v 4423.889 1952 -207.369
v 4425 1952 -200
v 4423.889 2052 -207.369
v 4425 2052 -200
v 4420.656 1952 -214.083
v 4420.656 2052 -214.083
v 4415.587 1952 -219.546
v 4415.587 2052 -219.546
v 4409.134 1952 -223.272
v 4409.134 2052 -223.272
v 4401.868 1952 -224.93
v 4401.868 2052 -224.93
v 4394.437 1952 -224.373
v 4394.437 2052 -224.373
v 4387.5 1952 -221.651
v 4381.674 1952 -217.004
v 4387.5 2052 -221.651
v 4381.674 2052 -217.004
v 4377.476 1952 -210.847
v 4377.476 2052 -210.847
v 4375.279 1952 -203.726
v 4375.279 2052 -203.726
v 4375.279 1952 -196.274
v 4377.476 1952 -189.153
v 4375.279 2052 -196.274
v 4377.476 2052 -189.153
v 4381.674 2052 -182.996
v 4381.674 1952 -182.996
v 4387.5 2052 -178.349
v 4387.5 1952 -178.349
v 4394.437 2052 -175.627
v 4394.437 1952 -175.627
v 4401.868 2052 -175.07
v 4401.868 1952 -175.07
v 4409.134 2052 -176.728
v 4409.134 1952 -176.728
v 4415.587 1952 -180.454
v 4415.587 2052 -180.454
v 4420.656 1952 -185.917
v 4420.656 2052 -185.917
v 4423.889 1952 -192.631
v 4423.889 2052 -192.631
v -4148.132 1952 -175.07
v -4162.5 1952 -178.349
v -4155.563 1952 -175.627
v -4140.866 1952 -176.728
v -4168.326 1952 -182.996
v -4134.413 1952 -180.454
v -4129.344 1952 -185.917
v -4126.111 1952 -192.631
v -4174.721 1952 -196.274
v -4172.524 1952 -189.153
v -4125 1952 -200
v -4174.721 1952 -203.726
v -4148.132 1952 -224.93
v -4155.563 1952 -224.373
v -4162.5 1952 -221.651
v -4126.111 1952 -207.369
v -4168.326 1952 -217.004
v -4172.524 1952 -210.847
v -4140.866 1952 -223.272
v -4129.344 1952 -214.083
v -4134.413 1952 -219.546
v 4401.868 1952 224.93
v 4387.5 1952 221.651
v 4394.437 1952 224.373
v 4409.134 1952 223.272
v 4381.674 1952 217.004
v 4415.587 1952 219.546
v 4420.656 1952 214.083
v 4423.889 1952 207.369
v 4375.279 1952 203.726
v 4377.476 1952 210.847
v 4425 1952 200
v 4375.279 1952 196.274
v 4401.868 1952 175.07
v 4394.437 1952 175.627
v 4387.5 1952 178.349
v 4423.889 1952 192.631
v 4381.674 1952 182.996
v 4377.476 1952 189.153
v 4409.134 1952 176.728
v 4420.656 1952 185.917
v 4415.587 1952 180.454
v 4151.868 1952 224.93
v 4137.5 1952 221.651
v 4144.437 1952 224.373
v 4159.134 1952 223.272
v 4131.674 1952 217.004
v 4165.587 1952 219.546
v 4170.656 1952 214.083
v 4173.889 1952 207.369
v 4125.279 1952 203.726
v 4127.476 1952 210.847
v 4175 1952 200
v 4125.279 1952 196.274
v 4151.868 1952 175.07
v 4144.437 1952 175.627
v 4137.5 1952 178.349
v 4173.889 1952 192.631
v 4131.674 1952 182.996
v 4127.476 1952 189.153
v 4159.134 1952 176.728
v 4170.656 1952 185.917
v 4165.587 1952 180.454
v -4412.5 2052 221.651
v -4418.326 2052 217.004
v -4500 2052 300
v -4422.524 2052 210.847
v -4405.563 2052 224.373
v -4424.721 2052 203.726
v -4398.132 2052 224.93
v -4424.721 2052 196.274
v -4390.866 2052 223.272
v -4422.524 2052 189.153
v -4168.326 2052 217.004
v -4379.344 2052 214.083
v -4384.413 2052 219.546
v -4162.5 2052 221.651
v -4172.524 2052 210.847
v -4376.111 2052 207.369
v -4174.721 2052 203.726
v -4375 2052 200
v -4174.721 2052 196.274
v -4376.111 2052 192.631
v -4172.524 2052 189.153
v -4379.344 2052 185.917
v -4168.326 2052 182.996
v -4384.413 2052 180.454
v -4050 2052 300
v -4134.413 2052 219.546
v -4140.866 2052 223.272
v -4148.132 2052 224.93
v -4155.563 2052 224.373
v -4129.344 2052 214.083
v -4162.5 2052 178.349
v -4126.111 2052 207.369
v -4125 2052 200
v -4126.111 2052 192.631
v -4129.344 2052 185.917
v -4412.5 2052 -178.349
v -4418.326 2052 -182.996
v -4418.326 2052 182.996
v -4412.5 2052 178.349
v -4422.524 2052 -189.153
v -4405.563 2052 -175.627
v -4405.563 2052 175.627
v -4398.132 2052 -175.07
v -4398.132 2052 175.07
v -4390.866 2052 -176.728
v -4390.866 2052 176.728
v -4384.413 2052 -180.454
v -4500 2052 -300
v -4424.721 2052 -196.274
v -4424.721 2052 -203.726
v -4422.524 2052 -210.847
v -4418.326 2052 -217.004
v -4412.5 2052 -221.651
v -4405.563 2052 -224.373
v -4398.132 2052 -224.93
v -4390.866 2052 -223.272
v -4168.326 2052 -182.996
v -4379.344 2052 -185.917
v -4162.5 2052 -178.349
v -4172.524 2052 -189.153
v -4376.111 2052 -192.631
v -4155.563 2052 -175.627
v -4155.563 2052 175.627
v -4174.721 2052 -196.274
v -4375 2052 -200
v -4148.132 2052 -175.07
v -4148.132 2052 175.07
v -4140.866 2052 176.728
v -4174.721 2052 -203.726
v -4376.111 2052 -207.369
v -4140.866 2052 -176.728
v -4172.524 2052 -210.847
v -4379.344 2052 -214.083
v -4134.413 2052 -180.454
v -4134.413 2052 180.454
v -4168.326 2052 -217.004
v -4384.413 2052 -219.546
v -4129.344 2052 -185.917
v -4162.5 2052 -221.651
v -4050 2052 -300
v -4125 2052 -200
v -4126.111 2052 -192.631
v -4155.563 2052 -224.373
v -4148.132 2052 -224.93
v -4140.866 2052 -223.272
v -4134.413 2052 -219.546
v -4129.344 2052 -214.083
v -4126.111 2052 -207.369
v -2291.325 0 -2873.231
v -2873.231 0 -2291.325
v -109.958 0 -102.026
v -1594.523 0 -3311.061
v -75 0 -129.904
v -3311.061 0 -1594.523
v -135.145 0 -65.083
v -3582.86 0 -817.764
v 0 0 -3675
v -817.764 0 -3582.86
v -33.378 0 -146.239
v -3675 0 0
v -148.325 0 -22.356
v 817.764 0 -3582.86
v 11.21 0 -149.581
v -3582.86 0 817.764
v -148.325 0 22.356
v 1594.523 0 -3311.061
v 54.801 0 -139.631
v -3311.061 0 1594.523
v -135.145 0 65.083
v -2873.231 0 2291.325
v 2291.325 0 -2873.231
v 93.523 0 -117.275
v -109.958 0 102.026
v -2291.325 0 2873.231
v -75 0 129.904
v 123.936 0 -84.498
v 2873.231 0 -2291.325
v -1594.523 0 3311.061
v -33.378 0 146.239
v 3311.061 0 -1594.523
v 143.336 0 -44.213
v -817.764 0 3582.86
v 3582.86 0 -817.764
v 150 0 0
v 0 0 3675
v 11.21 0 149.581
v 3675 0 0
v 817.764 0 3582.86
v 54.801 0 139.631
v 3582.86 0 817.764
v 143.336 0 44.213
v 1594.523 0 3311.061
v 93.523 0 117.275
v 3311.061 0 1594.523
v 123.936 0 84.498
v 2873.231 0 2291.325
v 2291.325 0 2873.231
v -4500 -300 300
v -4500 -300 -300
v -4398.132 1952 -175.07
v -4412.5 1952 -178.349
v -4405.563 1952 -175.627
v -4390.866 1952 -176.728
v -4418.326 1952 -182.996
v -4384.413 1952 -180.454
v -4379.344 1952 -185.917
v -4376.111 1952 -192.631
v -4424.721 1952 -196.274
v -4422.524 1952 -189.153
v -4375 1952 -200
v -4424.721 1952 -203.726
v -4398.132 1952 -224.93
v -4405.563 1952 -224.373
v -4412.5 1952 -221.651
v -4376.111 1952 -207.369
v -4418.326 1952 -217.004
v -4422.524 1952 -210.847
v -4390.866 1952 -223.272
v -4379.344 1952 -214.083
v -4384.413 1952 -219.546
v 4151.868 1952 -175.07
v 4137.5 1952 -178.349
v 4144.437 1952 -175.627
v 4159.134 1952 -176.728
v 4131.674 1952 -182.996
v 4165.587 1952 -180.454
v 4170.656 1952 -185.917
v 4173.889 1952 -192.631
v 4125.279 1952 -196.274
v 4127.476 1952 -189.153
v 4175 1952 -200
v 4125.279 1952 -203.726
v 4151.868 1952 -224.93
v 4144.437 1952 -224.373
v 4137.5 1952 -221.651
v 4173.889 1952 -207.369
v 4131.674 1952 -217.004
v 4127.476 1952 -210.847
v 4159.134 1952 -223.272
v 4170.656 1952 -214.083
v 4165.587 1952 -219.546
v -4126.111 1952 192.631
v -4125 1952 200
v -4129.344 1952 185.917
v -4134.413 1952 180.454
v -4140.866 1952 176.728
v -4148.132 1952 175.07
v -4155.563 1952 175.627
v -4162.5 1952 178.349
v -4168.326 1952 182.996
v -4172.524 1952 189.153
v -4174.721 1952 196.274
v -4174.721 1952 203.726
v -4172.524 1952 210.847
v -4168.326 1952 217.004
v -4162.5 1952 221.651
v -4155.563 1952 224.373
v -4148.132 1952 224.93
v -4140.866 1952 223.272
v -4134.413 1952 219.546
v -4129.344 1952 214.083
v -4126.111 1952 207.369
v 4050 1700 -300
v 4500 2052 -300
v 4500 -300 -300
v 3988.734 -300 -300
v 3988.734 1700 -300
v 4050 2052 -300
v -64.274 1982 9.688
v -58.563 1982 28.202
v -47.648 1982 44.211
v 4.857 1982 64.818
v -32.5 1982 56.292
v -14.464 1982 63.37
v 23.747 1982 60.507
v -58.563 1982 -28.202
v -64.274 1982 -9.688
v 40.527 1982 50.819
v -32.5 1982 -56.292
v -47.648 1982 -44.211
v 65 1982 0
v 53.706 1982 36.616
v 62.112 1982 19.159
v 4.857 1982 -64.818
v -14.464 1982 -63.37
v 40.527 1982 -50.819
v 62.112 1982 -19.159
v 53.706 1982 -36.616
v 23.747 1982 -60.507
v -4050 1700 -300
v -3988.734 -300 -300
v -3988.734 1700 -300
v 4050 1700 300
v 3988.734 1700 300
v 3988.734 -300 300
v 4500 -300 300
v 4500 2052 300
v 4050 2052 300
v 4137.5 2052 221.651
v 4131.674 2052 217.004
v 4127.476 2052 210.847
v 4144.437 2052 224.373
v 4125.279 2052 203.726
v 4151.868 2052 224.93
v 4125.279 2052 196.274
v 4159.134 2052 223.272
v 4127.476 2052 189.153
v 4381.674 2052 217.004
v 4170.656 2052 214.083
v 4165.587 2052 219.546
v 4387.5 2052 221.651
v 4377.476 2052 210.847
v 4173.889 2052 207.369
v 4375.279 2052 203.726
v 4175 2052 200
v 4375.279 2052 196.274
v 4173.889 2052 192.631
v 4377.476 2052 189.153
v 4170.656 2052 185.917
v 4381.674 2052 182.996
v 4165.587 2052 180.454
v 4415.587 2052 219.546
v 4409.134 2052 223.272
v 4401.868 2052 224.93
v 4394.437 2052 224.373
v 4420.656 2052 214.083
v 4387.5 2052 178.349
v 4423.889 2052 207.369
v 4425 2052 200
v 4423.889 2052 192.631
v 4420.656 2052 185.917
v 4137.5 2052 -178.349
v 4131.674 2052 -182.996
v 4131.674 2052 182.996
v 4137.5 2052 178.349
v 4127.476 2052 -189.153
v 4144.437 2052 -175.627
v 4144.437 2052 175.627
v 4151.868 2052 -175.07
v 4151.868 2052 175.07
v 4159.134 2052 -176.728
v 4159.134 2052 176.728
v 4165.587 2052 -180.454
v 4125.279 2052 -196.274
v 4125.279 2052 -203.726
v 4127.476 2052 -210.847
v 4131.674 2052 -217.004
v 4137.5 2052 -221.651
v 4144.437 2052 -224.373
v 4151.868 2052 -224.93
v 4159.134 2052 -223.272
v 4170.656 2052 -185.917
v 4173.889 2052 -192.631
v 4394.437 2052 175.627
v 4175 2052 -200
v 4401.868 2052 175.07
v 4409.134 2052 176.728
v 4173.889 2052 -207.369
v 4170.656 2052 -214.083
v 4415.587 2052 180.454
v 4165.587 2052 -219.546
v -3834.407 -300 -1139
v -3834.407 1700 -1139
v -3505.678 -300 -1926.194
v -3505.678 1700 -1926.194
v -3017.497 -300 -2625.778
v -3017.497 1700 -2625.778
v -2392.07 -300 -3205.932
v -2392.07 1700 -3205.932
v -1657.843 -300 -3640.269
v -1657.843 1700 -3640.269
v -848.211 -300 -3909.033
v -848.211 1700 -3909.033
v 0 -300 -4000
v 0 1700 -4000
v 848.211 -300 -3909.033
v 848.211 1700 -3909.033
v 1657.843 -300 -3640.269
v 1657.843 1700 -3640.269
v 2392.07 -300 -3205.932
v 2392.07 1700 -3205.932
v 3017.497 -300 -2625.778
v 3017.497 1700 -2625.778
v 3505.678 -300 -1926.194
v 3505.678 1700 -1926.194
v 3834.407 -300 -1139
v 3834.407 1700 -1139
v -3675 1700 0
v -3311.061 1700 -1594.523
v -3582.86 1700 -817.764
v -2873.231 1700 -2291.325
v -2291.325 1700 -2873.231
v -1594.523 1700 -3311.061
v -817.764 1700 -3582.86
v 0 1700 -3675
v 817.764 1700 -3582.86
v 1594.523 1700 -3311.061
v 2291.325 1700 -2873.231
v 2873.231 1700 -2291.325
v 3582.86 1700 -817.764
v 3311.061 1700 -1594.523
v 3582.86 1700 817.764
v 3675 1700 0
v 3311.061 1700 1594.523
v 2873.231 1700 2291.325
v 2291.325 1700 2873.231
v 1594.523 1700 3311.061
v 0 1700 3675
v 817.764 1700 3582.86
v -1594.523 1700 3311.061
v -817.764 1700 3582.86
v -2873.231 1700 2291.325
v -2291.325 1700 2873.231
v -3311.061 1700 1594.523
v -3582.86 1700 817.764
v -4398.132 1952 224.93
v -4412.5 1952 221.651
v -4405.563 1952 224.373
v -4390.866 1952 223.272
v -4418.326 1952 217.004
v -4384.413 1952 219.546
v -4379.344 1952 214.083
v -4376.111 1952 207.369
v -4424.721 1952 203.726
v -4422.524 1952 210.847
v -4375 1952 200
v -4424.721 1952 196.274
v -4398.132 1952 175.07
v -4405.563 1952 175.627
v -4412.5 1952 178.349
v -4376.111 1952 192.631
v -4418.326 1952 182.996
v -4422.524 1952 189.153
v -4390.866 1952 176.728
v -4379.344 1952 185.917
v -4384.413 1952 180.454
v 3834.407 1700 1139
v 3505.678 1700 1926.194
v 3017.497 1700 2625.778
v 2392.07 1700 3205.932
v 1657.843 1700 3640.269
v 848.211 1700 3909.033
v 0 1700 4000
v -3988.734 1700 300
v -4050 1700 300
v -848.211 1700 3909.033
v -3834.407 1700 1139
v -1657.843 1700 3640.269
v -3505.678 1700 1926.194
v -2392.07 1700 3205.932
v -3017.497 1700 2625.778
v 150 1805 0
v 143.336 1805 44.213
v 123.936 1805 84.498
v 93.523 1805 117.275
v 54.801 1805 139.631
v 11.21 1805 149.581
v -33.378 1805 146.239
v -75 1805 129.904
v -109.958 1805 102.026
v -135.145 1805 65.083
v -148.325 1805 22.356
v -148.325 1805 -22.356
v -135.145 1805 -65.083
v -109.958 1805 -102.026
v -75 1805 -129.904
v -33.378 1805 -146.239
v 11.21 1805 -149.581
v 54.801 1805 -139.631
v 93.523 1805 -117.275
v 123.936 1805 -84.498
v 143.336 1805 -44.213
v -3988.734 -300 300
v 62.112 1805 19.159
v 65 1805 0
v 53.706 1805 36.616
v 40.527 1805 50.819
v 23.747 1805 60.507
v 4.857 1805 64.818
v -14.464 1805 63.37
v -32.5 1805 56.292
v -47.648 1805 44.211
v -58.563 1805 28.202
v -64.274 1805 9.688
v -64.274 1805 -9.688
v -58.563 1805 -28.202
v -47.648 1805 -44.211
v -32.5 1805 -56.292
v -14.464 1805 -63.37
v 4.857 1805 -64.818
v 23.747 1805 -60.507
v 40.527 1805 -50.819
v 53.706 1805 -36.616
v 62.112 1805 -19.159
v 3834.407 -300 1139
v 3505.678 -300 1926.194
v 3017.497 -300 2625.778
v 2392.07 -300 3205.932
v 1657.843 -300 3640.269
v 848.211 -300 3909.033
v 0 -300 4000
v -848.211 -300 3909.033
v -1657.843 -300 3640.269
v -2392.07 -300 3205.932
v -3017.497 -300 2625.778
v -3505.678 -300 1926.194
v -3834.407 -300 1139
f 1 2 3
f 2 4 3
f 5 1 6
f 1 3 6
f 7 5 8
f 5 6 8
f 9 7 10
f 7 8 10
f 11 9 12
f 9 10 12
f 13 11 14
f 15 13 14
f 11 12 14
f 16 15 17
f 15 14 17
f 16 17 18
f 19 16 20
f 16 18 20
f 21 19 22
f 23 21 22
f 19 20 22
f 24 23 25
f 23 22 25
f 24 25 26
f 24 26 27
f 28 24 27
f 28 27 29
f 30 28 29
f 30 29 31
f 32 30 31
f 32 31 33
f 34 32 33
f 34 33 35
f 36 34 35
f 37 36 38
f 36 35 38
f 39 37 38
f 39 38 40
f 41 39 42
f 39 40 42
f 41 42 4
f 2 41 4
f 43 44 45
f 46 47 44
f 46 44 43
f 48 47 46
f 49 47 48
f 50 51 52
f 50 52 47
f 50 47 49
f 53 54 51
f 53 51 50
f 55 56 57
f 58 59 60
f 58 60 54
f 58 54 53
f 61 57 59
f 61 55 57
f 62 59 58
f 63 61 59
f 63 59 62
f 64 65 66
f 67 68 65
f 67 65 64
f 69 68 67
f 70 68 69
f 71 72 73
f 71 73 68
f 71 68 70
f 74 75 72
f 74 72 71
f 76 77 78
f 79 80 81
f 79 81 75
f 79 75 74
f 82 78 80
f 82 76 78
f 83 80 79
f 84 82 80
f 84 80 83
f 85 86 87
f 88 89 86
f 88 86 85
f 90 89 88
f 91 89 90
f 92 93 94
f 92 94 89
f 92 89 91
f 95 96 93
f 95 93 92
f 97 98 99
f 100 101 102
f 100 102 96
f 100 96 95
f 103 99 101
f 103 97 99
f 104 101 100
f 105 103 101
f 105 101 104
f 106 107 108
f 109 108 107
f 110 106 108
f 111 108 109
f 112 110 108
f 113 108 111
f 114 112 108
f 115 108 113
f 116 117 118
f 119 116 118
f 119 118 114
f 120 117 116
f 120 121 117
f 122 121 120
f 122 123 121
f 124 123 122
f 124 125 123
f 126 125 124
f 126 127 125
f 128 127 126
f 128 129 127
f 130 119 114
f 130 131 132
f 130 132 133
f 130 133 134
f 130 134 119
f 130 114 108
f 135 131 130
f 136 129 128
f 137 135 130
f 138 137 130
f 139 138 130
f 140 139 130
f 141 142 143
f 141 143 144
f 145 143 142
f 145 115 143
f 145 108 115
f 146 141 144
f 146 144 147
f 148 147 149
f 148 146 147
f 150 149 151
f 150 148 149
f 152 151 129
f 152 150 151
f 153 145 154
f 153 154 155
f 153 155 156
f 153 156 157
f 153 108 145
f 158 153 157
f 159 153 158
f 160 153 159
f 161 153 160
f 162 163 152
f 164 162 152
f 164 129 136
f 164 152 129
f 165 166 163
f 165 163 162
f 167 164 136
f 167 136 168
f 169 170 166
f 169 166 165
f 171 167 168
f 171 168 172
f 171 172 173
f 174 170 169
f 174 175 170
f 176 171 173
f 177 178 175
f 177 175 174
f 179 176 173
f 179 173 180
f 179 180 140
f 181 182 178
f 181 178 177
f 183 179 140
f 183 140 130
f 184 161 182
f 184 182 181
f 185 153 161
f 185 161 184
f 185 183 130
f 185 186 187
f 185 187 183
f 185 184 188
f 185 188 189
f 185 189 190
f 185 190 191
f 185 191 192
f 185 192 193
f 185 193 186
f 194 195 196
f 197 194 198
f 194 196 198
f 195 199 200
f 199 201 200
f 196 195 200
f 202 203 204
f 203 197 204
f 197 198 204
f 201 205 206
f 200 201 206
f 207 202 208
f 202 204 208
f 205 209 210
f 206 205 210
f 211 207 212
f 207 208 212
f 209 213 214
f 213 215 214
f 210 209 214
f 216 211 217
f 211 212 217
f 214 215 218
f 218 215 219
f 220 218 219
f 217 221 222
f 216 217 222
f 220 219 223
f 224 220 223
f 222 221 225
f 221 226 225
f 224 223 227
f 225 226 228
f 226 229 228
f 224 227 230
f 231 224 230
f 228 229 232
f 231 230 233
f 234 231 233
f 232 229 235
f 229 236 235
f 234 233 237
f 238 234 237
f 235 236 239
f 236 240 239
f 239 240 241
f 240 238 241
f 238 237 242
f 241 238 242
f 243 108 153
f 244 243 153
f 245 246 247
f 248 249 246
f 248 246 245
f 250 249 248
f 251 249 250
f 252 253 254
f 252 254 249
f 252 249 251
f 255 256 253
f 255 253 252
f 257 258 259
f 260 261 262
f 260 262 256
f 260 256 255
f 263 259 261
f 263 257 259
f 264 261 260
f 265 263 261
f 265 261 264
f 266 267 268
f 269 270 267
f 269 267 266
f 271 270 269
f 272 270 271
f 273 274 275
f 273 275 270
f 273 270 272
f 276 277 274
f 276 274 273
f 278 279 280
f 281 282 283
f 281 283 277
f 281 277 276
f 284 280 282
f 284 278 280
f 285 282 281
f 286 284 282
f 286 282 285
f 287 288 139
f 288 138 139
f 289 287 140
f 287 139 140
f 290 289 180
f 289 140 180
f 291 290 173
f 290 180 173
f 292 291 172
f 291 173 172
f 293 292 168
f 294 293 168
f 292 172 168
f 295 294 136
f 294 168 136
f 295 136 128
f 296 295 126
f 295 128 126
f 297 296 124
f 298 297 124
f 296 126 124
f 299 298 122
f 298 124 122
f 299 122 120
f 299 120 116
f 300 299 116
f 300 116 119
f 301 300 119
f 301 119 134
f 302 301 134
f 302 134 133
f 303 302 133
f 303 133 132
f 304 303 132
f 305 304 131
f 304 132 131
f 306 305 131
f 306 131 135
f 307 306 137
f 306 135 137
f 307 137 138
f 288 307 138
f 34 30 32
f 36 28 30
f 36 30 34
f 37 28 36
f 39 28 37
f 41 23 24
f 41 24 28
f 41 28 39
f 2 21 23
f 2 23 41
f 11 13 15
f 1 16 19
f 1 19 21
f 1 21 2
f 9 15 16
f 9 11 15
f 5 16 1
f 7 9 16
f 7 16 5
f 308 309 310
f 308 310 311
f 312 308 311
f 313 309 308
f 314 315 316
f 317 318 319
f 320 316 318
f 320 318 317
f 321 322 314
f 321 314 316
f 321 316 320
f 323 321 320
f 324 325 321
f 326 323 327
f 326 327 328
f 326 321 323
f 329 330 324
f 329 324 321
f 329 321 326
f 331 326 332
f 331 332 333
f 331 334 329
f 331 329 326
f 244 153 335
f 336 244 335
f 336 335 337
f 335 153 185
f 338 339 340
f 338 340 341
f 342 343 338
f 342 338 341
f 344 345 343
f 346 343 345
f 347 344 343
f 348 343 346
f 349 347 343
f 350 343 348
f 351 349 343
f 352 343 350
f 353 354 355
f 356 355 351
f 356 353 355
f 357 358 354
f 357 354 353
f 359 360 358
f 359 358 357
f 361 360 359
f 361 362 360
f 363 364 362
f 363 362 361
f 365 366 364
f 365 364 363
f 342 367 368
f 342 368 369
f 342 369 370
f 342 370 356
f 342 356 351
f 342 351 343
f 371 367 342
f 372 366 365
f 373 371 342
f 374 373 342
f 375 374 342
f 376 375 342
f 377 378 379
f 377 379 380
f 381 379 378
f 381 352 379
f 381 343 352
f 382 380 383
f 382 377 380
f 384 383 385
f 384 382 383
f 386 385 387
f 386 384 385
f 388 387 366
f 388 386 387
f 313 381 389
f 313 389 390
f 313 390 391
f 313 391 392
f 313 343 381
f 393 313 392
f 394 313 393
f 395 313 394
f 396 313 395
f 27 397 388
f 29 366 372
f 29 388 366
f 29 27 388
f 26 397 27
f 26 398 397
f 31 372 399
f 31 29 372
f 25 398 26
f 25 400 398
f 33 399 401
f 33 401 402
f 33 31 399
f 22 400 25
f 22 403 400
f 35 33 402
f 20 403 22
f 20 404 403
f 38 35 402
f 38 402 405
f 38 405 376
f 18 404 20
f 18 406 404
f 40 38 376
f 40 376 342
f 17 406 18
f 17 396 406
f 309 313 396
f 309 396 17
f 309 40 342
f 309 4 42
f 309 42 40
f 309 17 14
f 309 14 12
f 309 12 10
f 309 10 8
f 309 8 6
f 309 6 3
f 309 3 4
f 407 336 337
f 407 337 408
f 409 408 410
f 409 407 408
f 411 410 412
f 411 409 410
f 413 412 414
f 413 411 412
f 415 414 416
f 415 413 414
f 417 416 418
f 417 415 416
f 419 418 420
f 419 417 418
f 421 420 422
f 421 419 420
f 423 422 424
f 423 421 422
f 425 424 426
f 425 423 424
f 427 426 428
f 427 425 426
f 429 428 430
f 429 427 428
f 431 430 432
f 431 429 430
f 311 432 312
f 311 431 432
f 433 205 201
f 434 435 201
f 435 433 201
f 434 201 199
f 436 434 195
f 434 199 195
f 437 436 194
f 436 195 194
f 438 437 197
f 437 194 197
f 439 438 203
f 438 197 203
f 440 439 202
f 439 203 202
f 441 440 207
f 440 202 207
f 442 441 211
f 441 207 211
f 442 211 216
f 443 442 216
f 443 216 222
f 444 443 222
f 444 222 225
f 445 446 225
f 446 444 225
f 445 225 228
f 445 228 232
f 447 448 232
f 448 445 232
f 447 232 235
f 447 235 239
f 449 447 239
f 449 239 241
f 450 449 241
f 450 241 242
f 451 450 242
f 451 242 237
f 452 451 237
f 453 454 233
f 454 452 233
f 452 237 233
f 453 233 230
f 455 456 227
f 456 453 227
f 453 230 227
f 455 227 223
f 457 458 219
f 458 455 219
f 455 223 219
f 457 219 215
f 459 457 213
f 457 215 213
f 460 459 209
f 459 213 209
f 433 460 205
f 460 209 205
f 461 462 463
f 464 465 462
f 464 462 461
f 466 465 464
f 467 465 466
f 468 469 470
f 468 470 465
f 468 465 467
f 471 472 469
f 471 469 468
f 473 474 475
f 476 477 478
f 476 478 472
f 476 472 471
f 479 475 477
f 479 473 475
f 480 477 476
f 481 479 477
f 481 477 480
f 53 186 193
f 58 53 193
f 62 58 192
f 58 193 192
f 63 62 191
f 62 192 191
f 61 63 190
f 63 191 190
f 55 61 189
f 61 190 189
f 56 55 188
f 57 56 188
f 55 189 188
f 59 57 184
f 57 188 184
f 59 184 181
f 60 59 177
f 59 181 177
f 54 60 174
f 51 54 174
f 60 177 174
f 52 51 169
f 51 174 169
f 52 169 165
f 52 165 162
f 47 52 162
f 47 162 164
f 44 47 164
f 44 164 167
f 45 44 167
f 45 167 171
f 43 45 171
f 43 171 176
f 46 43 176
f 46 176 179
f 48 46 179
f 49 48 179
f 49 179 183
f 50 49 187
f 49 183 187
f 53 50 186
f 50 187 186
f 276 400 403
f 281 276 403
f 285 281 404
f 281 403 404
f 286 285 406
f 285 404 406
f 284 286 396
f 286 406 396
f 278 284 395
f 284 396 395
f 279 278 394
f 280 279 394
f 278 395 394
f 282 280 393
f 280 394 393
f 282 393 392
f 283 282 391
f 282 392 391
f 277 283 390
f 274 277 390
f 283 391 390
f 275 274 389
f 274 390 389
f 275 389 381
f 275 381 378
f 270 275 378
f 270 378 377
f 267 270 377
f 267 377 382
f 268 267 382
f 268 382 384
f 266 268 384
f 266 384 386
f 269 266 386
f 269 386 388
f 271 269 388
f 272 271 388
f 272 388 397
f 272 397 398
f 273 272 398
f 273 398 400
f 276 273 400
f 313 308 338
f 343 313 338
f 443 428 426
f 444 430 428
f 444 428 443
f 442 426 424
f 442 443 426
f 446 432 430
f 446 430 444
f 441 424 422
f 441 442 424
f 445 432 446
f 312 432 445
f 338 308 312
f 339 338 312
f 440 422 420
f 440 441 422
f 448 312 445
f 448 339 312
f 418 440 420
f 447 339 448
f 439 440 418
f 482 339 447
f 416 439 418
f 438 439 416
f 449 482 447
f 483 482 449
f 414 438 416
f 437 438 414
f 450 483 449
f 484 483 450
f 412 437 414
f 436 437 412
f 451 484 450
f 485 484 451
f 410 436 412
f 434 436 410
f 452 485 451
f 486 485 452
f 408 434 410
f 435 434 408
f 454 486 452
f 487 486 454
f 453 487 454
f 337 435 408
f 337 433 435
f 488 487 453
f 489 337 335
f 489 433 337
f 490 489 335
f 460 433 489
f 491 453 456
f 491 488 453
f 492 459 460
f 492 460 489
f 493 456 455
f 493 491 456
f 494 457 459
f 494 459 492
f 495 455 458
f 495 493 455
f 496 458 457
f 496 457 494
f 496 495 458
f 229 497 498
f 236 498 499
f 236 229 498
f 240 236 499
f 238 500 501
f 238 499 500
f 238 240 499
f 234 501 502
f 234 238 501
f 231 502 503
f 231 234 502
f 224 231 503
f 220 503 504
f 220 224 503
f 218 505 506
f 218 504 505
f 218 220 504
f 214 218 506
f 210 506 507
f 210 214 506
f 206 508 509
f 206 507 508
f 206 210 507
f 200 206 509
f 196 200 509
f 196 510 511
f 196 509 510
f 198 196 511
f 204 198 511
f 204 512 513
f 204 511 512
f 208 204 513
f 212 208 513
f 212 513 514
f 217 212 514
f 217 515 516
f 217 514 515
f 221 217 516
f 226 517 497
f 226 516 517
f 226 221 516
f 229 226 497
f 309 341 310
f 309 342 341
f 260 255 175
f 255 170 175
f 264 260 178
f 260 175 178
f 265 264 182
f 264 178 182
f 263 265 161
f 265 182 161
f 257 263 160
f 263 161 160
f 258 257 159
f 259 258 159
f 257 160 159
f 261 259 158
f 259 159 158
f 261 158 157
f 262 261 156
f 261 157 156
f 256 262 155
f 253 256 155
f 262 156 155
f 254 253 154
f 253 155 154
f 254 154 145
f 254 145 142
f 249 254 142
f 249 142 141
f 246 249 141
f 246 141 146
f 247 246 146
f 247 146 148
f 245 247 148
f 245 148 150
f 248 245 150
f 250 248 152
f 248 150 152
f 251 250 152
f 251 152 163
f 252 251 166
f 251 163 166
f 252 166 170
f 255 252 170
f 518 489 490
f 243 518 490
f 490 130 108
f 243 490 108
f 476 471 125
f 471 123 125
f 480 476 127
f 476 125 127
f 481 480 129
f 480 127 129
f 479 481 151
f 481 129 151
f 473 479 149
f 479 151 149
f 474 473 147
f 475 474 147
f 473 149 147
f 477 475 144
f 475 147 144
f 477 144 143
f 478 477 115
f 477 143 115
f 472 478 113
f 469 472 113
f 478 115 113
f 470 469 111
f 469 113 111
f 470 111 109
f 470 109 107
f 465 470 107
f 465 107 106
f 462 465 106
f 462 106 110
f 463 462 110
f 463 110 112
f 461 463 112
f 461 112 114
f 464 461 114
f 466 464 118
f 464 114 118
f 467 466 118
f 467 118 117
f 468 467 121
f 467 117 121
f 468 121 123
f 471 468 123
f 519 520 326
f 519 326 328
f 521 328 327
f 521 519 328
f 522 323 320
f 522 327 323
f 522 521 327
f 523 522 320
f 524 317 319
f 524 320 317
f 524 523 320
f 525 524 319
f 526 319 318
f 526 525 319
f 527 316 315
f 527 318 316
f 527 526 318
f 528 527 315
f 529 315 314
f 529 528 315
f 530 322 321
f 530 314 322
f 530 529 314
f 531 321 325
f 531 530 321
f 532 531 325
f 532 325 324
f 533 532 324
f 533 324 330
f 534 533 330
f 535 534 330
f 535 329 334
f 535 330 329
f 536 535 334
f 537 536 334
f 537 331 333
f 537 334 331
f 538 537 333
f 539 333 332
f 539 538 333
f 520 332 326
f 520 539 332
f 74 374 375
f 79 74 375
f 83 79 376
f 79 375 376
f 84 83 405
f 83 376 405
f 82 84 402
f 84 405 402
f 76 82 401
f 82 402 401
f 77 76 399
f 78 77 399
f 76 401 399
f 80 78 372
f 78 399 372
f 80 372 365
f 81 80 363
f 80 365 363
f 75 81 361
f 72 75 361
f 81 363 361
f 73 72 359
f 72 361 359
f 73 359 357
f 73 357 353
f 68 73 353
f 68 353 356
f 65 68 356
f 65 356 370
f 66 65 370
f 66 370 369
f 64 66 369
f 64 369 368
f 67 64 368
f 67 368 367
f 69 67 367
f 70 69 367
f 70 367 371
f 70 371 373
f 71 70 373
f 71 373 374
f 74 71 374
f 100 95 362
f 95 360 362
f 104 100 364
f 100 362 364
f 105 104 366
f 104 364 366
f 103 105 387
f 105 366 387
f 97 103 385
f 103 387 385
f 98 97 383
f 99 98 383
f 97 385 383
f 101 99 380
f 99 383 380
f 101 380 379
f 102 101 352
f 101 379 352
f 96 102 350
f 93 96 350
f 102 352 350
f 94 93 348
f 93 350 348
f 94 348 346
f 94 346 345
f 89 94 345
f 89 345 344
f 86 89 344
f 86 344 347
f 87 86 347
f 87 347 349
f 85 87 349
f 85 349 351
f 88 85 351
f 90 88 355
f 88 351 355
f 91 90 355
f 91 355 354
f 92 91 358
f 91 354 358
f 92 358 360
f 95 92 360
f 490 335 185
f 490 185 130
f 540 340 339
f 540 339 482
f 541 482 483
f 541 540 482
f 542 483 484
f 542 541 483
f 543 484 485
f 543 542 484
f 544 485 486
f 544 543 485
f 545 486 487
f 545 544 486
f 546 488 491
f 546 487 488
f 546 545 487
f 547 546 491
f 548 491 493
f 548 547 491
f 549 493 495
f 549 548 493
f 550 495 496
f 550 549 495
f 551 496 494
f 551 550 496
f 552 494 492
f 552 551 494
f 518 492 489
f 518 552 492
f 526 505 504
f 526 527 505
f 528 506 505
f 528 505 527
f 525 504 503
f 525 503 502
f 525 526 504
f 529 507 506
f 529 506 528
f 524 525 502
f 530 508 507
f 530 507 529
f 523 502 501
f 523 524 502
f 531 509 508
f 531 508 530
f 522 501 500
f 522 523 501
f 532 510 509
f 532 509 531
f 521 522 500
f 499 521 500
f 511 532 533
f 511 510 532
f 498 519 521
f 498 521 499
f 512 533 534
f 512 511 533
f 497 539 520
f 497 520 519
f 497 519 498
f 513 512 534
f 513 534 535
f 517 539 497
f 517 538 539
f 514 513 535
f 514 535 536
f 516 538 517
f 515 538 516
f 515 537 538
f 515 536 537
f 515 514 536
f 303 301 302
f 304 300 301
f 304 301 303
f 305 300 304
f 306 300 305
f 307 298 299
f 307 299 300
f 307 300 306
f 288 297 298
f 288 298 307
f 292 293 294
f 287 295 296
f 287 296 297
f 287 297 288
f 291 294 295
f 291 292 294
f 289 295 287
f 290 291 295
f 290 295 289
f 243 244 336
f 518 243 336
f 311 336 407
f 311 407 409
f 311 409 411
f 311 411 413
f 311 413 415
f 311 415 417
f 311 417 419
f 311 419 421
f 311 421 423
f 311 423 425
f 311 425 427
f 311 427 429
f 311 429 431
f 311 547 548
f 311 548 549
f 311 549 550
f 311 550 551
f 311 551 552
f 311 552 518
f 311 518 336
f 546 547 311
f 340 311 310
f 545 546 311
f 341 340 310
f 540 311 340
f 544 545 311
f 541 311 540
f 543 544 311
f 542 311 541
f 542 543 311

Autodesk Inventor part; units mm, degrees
ref_plane "YZ Plane" through (0, 0, 0) normal (1, 0, 0) x (0, 1, 0)
ref_plane "XZ Plane" through (0, 0, 0) normal (0, 1, 0) x (-1, 0, 0)
ref_plane "XY Plane" through (0, 0, 0) normal (0, 0, 1) x (1, 0, 0)
sketch "Sketch1" plane through (0, 0, 0) normal (0, 1, 0) x (-1, 0, 0)
  circle A0 centre (0, 0) radius 4000 construction
  circle A1 centre (0, 0) radius 4000
  circle A2 centre (0, 0) radius 3675
  dimension "d0" = 8000
  dimension "d29" = 7350
  dimension "d30" = 8000
extrude "Extrusion1" add sketch "Sketch1" along normal blind 1700
sketch "Sketch5" plane through (0, 0, 0) normal (0, -1, 0) x (1, 0, 0)
  circle A0 centre (0, 0) radius 4000
  dimension "d31" = 8000
extrude "Extrusion5" add sketch "Sketch5" along normal blind 300
sketch "Sketch6" plane through (0, 0, 0) normal (0, 1, 0) x (1, 0, 0)
  circle A0 centre (0, 0) radius 150
  dimension "d15" = 300
extrude "Extrusion6" add sketch "Sketch6" along normal blind 1805
sketch "Sketch7" plane through (0, 1805, 0) normal (0, 1, 0) x (1, 0, 0)
  circle A0 centre (0, 0) radius 65
  dimension "d18" = 130
extrude "Extrusion7" add sketch "Sketch7" along normal blind 177
sketch "Sketch8" plane through (0, 1700, 0) normal (0, 1, 0) x (1, 0, 0)
  circle A0 centre (0, 0) radius 65 projected
  circle A1 centre (0, 0) radius 4000
  circle A2 centre (0, 0) radius 4500
  line L0 (3988.7341, -300) -> (4500, -300)
  line L1 (4500, -300) -> (4500, 300)
  line L2 (4500, 300) -> (3988.7341, 300)
  line L3 (4000, 300) -> (4000, -300)
  line L4 (4000, -300) -> (4500, 300) construction
  line L5 (4500, -300) -> (4000, 300) construction
  line L6 (0, 4500) -> (0, -5103.1646) construction
  line L7 (-3988.7341, -300) -> (-4500, -300)
  line L8 (-4500, -300) -> (-4500, 300)
  line L9 (-4500, 300) -> (-3988.7341, 300)
  line L10 (-4000, 300) -> (-4000, -300)
  line L11 (-4000, -300) -> (-4500, 300) construction
  line L12 (-4500, -300) -> (-4000, 300) construction
  point P0 (4250, 0)
  point P1 (-4250, 0)
  point P2 (-3988.7341, -300)
  point P3 (-3988.7341, 300)
  dimension "d35" = 8000
  dimension "d40" = 500
  dimension "d41" = 600
extrude "Extrusion8" add sketch "Sketch8" against normal up to surface (2000 mm away) contours L3 L0 A1 | A1 L2 L3 | L3 L2 A2 L0 | A1 L10 L9 | L7 L10 A1 | L2 L1 A2 | A2 L1 L0 | L10 L7 A2 L9 | A2 L8 L9 | L7 L8 A2
sketch "Sketch10" plane through (0, 1700, 0) normal (0, 1, 0) x (1, 0, 0)
  line L0 (-3988.7341, 300) -> (-4500, 300) projected
  line L1 (-4500, -300) -> (-3988.7341, -300) projected
  line L2 (-4500, 300) -> (-4050, 300)
  line L3 (-4050, 300) -> (-4050, -300)
  line L4 (-4050, -300) -> (-4500, -300)
  line L5 (-4500, -300) -> (-4500, 300)
  line L6 (4500, -300) -> (4500, 300) projected
  line L7 (4500, 300) -> (4050, 300)
  line L8 (4050, 300) -> (4050, -300)
  line L9 (4050, -300) -> (4500, -300)
  line L10 (4500, -300) -> (4500, 300)
  point P0 (0, 0)
  point P1 (-4050, 300)
  point P2 (-4050, 300)
  dimension "d43" = 450
  dimension "d44" = 450
extrude "Extrusion10" add sketch "Sketch10" along normal blind 352
sketch "Sketch11" plane through (0, 2052, 0) normal (0, 1, 0) x (1, 0, 0)
  line L0 (-4500, 300) -> (-4500, -300) projected
  line L1 (4050, -300) -> (4500, -300) projected
  line L2 (-4500, 300) -> (4500, 300)
  line L3 (4500, 300) -> (4500, -300)
  line L4 (4500, -300) -> (-4500, -300)
  line L5 (-4500, -300) -> (-4500, 300)
  point P0 (0, 0)
sketch "Sketch12" plane through (0, 2052, 0) normal (0, 1, 0) x (1, 0, 0)
  line L0 (-3988.7341, 300) -> (-4500, 300) projected
  line L1 (-4050, -300) -> (-3988.7341, -300) projected
  line L2 (-4500, 300) -> (-4050, 300)
  line L3 (-4050, 300) -> (-4050, -300)
  line L4 (-4050, -300) -> (-4500, -300)
  line L5 (-4500, -300) -> (-4500, 300)
  line L6 (-4400, 200) -> (-4150, 200)
  line L7 (-4150, 200) -> (-4150, -200)
  line L8 (-4150, -200) -> (-4400, -200)
  line L9 (-4400, -200) -> (-4400, 200)
  line L10 (0, 5520.4095) -> (0, -5368.8003) construction
  line L11 (3988.7341, 300) -> (4500, 300)
  line L12 (4050, -300) -> (3988.7341, -300)
  line L13 (4500, 300) -> (4050, 300)
  line L14 (4050, 300) -> (4050, -300)
  line L15 (4050, -300) -> (4500, -300)
  line L16 (4500, -300) -> (4500, 300)
  line L17 (4400, 200) -> (4150, 200)
  line L18 (4150, 200) -> (4150, -200)
  line L19 (4150, -200) -> (4400, -200)
  line L20 (4400, -200) -> (4400, 200)
  circle A0 centre (-4400, 200) radius 25
  circle A1 centre (-4150, 200) radius 25
  circle A2 centre (-4400, -200) radius 25
  circle A3 centre (-4150, -200) radius 25
  circle A4 centre (4150, 200) radius 25
  circle A5 centre (4400, 200) radius 25
  circle A6 centre (4150, -200) radius 25
  circle A7 centre (4400, -200) radius 25
  point P0 (0, 0)
  dimension "d47" = 100
  dimension "d48" = 50
  dimension "d49" = 50
  dimension "d50" = 50
  dimension "d51" = 50
  dimension "d52" = 50
  dimension "d53" = 50
  dimension "d54" = 50
  dimension "d55" = 50
extrude "Extrusion11" cut sketch "Sketch12" against normal blind 100 contours L9 A0 L6 | L6 A0 L9 | A1 L7 L6 | L6 L7 A1 | A2 L8 L9 | L9 L8 A2 | A3 L8 L7 | L7 L8 A3 | A4 L18 L17 | L17 L18 A4 | A5 L20 L17 | L17 L20 A5 | A6 L19 L18 | L18 L19 A6 | A7 L19 L20 | L20 L19 A7
properties part number "Vasca" material "Concrete"
